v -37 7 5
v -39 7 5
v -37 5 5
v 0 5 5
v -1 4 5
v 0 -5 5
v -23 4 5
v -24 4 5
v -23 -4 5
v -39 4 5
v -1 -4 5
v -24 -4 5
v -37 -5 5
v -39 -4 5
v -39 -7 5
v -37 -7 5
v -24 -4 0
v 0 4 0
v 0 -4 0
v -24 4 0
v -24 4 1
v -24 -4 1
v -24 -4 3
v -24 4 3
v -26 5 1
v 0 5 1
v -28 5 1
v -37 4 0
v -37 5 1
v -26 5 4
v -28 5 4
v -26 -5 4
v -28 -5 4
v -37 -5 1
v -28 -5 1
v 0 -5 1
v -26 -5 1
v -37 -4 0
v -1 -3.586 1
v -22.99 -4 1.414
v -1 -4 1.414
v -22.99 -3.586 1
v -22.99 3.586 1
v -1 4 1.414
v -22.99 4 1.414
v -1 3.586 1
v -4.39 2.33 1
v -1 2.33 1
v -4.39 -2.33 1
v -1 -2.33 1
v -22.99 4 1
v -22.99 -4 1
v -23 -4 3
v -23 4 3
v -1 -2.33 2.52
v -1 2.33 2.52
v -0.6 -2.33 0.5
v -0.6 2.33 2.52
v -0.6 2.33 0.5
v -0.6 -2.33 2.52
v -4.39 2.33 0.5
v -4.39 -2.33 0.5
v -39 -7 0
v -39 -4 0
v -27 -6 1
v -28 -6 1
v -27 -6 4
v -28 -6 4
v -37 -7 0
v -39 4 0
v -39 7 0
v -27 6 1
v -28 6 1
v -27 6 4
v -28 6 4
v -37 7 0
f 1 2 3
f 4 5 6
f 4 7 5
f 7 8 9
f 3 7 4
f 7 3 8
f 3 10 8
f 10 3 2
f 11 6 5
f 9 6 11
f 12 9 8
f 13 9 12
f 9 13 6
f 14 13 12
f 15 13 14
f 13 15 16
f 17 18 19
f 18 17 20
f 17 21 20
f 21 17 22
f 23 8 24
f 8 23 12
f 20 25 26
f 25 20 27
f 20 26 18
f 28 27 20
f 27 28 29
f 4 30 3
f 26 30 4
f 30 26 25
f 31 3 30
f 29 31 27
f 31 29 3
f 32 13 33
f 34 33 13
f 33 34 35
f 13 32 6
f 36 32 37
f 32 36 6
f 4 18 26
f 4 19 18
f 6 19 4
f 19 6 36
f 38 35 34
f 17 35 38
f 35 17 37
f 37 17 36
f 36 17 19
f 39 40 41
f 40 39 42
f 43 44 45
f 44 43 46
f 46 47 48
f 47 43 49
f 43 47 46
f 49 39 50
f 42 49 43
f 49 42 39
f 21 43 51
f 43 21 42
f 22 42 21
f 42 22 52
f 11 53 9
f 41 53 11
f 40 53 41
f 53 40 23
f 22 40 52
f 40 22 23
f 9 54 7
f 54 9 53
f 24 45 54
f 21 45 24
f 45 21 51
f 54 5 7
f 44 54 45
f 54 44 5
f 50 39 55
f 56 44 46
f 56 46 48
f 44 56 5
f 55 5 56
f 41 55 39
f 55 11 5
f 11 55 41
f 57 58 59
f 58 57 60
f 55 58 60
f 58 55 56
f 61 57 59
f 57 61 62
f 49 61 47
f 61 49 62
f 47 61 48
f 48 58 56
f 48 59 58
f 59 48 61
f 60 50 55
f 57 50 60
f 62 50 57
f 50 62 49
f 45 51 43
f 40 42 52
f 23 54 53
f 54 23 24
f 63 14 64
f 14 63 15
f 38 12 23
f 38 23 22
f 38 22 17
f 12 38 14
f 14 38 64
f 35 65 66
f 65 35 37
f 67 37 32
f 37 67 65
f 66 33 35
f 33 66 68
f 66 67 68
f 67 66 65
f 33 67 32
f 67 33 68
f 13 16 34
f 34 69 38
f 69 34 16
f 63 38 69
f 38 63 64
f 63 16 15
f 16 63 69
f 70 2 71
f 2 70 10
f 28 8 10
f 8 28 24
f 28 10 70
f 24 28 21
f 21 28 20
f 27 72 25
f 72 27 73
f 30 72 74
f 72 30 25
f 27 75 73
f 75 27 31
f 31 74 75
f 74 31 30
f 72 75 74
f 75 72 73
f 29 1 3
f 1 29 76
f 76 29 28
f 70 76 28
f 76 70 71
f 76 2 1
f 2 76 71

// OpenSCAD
// file: HallSensor.scad
//############################################################################## 
//                          Odometer Body
//############################################################################## 
// 
// Odometer for the toy car Tamiya TT-02. The odometer can be mounted at the
// differential output shaft.
//
// This part is the Hall Sensor itself.
//

// Dimensions of "Infineon TLE 4905L"
body_l = 3.29;
body_w = 4.16;
body_h = 1.52;

bevel_w = 0.8;
bevel_h = 0.8;

wire_l = 20;
wire_w = 0.4;
wire_h = 0.2;
wire_pos_h = body_h - 0.79;
wire_dist = 1.27;

module HallSensor() {
    // Wire
    module Wire() {
        color("LightSteelBlue")
        translate([0, -wire_w/2, -wire_h/2])
        rotate([0, -90, 0])
        cube(size=[wire_h, wire_w, wire_l]);
    }

    // Body of the Hall Sensor
    color("Gray")
    rotate([0, -90, 0])
    linear_extrude(height=body_l)
    polygon(points=[
        [ 0                ,  body_w/2           ],
        [ body_h - bevel_h ,  body_w/2           ],
        [ body_h           ,  body_w/2 - bevel_w ],
        [ body_h           , -body_w/2 + bevel_w ],
        [ body_h - bevel_h , -body_w/2           ],
        [ 0                , -body_w/2           ],
    ]);

    // Create and place the wires
    translate([-body_l, wire_dist, wire_pos_h])
    Wire();
    translate([-body_l, 0, wire_pos_h])
    Wire();
    translate([-body_l, -wire_dist, wire_pos_h])
    Wire();
}

function HallSensor_body_l() = body_l;
function HallSensor_body_w() = body_w;
function HallSensor_body_h() = body_h;

HallSensor();
// file: helpers.scad
//##############################################################################
//                               Helpers
//##############################################################################
//
// Helper functions and modules


// A mirror module that retains the original
// object in addition to the mirrored one.
//
// Taken from:
// 
// https://en.wikibooks.org/wiki/OpenSCAD_User_Manual/Tips_and_Tricks#Create_a_mirrored_object_while_retaining_the_original
//
module mirror_copy(v=[1, 0, 0]) {
    children();

    mirror(v) 
    children();
}

// A rotation module that retains the original
// object in addition to the mirrored one.
module rotate_copy(a=[10, 10, 10]) {
    children();

    rotate(a) 
    children();
}

// A translation module that retains the original
// object in addition to the mirrored one.
module translate_copy(t=[0, 0, 0]) {
    children();

    translate(t) 
    children();
}
// main file
//############################################################################## 
//                          Odometer Hall Sensor Insert
//############################################################################## 
// 
// Odometer for the toy car Tamiya TT-02. The odometer can be mounted at the
// differential output shaft.
//
// This part is the insert that carries the hall sensor. It snaps into the body.
//
// Current State
// ====================
// 
// * The current locking mechanism seems very secure.
// * The insert can reasonably easily be removed with the handles.
//
// * The insert is big enough for the sensor, and maybe also for a circuit
//   board.
//
// * It needs to be tested if the sensor gets close enough to the magnets to
//   trigger.
//

use <helpers.scad>

use <HallSensor.scad>

// Dimensions of the main part ------------------
main_l = 24;
main_w = 10;
main_h = 5;

bevel_w = 1;
wall_t = 1;

// Dimensions of the locking mechanism ----------
// Teeth
teeth_l = 2;
teeth_w = 1;
teeth_h = 3;
teeth_pos_l = 4;
teeth_pos_h = 1.0;

// Cantilever / Strip
lock_l = 15;
lock_w = 1;
lock_h = main_h;

// Grip
grip_l = 2;
grip_w = 3;
grip_h = lock_h;

// The locking part, consisting of two strips / cantilevers with teeth.
module SensorInsert_lock() {
    // Tooth for locking
    module lock_tooth() {
        linear_extrude(height=teeth_h)
        polygon(points=[
            [ 0      , 0       ],
            [-teeth_l, 0       ],
            [-teeth_l,-teeth_w ],
            [-teeth_w,-teeth_w ],
        ]);
    }

    // Outer shape of the insert
    module main_shape() {
        rotate([0, -90, 0])
        linear_extrude(height=lock_l)
        SensorInsert_front_side_2D();
    }

    // The plastic strip that carries the tooth
    module lock_strip() {
        // Create the strip, and shape it like the outer shape of the insert.
        intersection() {
            translate([-lock_l, -main_w/2,  0])
            cube(size=[lock_l, lock_w, lock_h]);

            main_shape();
        }

        // Create and position the tooth
        translate([-teeth_pos_l + teeth_l, - main_w/2,  teeth_pos_h])
        lock_tooth();

        // Create and position the grip
        translate([-lock_l, -main_w/2 - grip_w + lock_w, 0])
        cube(size=[grip_l, grip_w, grip_h]);
    }

    // Strip 1
    lock_strip();

    // Strip 2
    mirror([0, 1, 0]) 
    lock_strip();
}

// // Symmetrically bevelled front side
// module SensorInsert_front_side_2D() {
//     polygon(points=[
//         [ 0               ,  main_w/2 - bevel_w ],
//         [ bevel_w         ,  main_w/2           ],
//         [ main_h - bevel_w,  main_w/2           ],
//         [ main_h          ,  main_w/2 - bevel_w ],
//         [ main_h          , -main_w/2 + bevel_w ],
//         [ main_h - bevel_w, -main_w/2           ],
//         [ bevel_w         , -main_w/2           ],
//         [ 0               , -main_w/2 + bevel_w ],
//     ]);
// }

// // Front side which is bevelled at the top
// module SensorInsert_front_side_2D() {
//     polygon(points=[
//         [ 0               ,  main_w/2           ],
//         [ bevel_w         ,  main_w/2           ],
//         [ main_h - bevel_w,  main_w/2           ],
//         [ main_h          ,  main_w/2 - bevel_w ],
//         [ main_h          , -main_w/2 + bevel_w ],
//         [ main_h - bevel_w, -main_w/2           ],
//         [ bevel_w         , -main_w/2           ],
//         [ 0               , -main_w/2           ],
//     ]);
// }

// Front side which is bevelled at the bottom
module SensorInsert_front_side_2D() {
    polygon(points=[
        [ 0               ,  main_w/2 - bevel_w ],
        [ bevel_w         ,  main_w/2           ],
        [ main_h - bevel_w,  main_w/2           ],
        [ main_h          ,  main_w/2           ],
        [ main_h          , -main_w/2           ],
        [ main_h - bevel_w, -main_w/2           ],
        [ bevel_w         , -main_w/2           ],
        [ 0               , -main_w/2 + bevel_w ],
    ]);
}

// Front side of the hollow space inside of the insert.
module SensorInsert_front_side_negative_2D() {
    offset(delta=-wall_t) {
        SensorInsert_front_side_2D();
    }
    polygon(points=[
        [ main_h - wall_t - 1 , main_w/2 - bevel_w ],
        [ main_h + 1          , main_w/2 - bevel_w ],
        [ main_h + 1          ,-main_w/2 + bevel_w ],
        [ main_h - wall_t - 1 ,-main_w/2 + bevel_w ],
    ]);
}

module SensorInsert() {
    // Create the main part
    difference() {
        rotate([0, -90, 0])
        linear_extrude(height=main_l)
        SensorInsert_front_side_2D();

        // Hollow space in main part
        translate([-1, 0, 0])
        rotate([0, -90, 0])
        linear_extrude(height=main_l - wall_t*2 )
        SensorInsert_front_side_negative_2D();

        // Create a small indentation for the sensor
          sensor_body_l = HallSensor_body_l() + 0.5; 
          sensor_body_w = HallSensor_body_w() + 0.5; 
          sensor_body_h = HallSensor_body_h() + 0.5; 
        translate([-0.6, 0, 0.5])
        translate([
            -sensor_body_l, 
            -sensor_body_w / 2, 
            0
        ])
        cube([
            sensor_body_l, 
            sensor_body_w, 
            sensor_body_h
        ]);

        // Create a slot for the cables
        slot_l = wall_t + 0.02;
        slot_w = main_w - wall_t*2;
        slot_h = 2;
        translate([-main_l - 0.01, -slot_w/2, wall_t])
        cube(size=[slot_l, slot_w, slot_h]);
    }

    // Create the locking mechanism
    translate([-main_l, 0, 0])
    SensorInsert_lock();
}

// The hollow space needed by the sensor insert
module SensorInsert_negative() {
    // Make the hollow space slightly bigger than the insert.
    scale([1, 1.05, 1.1]) {
        // Create the main part
        rotate([0, -90, 0])
        linear_extrude(height=main_l + lock_l + 5)
        SensorInsert_front_side_2D();

        // Create pockets for the teeth of the locking mechanism.
        pocket_l = teeth_l * 1.5;
        pocket_w = teeth_w * 1.1;
        pocket_h = teeth_h * 1.0;
        mirror_copy([0, 1, 0])
        translate([
            -teeth_pos_l - main_l - (pocket_l - teeth_l)/2, 
            - main_w/2 - pocket_w + 0.01,  
            teeth_pos_h
        ])
        cube(size=[pocket_l, pocket_w, pocket_h]);
    }
}

function SensorInsert_total_h() = main_h;

SensorInsert();

%SensorInsert_negative();
